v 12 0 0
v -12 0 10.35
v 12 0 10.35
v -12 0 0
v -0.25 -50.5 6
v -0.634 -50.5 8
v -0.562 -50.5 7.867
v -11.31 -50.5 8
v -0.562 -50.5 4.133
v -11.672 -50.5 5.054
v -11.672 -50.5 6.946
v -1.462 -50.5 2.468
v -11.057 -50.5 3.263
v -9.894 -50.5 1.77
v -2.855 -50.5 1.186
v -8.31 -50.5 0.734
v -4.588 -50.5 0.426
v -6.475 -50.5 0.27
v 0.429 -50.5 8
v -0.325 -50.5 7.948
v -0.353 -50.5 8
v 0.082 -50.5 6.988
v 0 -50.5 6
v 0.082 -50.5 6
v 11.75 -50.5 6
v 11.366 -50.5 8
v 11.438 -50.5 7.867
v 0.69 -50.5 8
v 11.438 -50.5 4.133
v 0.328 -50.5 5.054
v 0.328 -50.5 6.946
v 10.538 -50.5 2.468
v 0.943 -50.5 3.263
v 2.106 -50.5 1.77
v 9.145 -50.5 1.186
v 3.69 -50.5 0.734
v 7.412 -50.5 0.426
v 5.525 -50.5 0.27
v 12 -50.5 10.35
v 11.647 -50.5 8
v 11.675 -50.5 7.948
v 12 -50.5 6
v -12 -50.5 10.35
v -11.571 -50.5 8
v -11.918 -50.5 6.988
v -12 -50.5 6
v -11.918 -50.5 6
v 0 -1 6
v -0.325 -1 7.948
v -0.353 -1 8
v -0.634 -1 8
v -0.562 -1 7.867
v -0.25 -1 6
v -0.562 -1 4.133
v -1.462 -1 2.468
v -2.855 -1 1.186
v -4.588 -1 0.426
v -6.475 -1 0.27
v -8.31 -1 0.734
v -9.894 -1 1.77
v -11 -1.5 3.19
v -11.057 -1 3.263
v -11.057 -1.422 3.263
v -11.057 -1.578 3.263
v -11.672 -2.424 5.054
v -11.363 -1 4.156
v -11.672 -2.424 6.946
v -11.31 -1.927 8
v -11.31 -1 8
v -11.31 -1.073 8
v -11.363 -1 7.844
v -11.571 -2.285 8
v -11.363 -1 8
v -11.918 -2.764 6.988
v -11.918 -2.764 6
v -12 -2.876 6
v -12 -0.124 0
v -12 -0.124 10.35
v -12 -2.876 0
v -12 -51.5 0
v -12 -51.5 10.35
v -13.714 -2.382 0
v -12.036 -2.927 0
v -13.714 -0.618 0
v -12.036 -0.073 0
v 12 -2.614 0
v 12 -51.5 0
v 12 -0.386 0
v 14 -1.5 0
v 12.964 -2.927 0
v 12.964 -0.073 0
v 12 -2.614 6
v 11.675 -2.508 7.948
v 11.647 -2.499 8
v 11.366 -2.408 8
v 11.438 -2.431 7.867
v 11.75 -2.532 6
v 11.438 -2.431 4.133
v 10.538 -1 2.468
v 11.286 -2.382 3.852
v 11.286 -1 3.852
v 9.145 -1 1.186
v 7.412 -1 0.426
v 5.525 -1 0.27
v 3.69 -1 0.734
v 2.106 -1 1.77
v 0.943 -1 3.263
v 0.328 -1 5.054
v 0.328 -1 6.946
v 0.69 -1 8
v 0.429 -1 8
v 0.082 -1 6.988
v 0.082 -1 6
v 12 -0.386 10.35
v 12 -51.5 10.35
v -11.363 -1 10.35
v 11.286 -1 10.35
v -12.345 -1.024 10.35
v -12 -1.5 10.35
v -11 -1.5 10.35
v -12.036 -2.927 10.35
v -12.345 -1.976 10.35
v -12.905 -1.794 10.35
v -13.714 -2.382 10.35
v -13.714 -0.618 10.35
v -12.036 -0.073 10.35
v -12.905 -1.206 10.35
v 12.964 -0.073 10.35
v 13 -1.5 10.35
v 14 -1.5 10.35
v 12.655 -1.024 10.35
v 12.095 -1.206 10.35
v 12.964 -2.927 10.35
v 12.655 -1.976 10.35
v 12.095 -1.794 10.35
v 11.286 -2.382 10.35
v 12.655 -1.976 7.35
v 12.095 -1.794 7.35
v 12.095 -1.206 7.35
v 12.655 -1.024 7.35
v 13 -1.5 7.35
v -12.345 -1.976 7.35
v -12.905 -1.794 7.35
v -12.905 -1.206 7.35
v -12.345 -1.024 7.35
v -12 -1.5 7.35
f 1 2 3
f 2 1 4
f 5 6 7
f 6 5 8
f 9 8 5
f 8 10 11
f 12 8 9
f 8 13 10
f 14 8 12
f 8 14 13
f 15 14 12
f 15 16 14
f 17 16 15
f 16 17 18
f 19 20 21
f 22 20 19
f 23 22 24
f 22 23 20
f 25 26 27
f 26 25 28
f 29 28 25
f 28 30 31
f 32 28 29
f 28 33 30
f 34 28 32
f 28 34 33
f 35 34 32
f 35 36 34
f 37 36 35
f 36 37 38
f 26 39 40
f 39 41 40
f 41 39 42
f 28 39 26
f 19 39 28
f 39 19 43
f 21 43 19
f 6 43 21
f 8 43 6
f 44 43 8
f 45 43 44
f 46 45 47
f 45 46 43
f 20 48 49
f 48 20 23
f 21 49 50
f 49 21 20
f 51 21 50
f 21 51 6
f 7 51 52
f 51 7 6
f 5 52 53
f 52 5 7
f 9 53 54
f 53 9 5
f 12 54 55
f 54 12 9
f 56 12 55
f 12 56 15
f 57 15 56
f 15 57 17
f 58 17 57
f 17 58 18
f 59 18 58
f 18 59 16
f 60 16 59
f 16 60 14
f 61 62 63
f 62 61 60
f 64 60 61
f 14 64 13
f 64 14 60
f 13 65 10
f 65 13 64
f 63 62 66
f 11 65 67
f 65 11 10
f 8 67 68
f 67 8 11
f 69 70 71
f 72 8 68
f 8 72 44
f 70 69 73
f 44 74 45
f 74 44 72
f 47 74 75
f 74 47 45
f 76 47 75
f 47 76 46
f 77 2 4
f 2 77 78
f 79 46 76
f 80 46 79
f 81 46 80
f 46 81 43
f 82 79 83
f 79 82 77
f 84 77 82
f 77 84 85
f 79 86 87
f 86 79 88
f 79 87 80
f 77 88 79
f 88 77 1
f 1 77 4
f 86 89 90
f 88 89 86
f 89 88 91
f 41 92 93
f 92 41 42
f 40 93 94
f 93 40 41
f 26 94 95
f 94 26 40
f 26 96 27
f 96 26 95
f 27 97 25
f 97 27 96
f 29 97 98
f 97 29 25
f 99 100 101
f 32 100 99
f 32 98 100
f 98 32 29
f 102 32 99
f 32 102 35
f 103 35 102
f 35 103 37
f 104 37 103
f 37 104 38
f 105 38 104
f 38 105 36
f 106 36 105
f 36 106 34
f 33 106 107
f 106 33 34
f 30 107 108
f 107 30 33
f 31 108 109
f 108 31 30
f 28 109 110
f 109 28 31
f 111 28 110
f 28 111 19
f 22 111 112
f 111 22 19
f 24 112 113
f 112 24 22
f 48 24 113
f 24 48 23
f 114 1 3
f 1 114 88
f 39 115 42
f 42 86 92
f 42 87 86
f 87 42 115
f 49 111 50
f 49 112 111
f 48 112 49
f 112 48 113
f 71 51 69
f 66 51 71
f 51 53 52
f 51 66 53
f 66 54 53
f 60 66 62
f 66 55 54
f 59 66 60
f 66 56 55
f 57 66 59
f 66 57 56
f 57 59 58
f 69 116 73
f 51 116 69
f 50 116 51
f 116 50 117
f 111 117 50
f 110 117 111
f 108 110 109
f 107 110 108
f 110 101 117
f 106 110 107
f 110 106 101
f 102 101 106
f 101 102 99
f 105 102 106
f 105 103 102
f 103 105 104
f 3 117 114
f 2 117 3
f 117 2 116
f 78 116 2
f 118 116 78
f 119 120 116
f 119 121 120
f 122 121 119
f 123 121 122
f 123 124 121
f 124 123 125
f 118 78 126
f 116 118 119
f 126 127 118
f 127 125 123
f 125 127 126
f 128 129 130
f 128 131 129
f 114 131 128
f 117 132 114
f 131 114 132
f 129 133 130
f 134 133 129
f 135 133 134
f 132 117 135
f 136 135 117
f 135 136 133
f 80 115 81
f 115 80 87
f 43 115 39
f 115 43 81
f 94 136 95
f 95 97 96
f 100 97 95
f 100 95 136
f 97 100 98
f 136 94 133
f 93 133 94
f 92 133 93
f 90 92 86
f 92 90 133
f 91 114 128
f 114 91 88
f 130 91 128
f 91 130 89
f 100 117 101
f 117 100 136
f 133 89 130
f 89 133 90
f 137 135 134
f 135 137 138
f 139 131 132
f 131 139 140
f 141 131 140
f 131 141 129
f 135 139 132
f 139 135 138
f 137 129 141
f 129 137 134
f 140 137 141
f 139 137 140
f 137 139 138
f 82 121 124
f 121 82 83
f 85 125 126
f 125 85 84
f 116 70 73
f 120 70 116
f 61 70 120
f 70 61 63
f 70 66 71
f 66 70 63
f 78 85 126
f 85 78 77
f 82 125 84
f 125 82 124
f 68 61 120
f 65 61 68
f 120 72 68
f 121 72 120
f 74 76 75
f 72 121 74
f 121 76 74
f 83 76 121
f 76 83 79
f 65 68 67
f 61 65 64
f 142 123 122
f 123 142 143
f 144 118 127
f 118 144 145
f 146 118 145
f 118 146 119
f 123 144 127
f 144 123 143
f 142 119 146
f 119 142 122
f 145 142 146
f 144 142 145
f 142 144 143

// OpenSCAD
d = 11.5; // Diameter of the cell
l = 44.5; // Length of the cell
thickness= 0.5; // Thickness of the main body
endThickness = 1; // Thickness of end parts, which may be thicker to give more stength.
outside = d + thickness; // Diameter of the case holding one cell
length = l + 6; // Length of the battery plus the spring connector, and fix connector.

module half()
{

	linear_extrude( length ) {
		difference() {
			union() {
				translate( [-outside/2,-outside/2] ) square( [outside, outside/2] );
				circle( d = outside );
			}
			circle( d = d );
			translate( [-outside/2, outside/6] ) square( [outside, outside] );
		}
	}
}

module batteryHolder()
{
	module post()
	{
		difference() {
			cylinder( d=3, h=height );
			#translate( [0,0,height - 3] ) cylinder( d=1, h=4 );
		}
	}

	height = d*0.9;

	translate( [0,0,outside/2] ) rotate( [90,0,0] ) {
		translate( [-outside/2,0,0] ) half();
		translate( [ outside/2,0,0] ) half();
		translate( [-outside, -outside/2, 0] ) cube( [outside *2, height, endThickness] );
		translate( [-outside, -outside/2, length] ) cube( [outside *2, height, endThickness] );
	}

	translate( [12.5,-1.5,0] ) post();
	translate( [-12.5,-1.5,0] ) post();;
}


batteryHolder();
